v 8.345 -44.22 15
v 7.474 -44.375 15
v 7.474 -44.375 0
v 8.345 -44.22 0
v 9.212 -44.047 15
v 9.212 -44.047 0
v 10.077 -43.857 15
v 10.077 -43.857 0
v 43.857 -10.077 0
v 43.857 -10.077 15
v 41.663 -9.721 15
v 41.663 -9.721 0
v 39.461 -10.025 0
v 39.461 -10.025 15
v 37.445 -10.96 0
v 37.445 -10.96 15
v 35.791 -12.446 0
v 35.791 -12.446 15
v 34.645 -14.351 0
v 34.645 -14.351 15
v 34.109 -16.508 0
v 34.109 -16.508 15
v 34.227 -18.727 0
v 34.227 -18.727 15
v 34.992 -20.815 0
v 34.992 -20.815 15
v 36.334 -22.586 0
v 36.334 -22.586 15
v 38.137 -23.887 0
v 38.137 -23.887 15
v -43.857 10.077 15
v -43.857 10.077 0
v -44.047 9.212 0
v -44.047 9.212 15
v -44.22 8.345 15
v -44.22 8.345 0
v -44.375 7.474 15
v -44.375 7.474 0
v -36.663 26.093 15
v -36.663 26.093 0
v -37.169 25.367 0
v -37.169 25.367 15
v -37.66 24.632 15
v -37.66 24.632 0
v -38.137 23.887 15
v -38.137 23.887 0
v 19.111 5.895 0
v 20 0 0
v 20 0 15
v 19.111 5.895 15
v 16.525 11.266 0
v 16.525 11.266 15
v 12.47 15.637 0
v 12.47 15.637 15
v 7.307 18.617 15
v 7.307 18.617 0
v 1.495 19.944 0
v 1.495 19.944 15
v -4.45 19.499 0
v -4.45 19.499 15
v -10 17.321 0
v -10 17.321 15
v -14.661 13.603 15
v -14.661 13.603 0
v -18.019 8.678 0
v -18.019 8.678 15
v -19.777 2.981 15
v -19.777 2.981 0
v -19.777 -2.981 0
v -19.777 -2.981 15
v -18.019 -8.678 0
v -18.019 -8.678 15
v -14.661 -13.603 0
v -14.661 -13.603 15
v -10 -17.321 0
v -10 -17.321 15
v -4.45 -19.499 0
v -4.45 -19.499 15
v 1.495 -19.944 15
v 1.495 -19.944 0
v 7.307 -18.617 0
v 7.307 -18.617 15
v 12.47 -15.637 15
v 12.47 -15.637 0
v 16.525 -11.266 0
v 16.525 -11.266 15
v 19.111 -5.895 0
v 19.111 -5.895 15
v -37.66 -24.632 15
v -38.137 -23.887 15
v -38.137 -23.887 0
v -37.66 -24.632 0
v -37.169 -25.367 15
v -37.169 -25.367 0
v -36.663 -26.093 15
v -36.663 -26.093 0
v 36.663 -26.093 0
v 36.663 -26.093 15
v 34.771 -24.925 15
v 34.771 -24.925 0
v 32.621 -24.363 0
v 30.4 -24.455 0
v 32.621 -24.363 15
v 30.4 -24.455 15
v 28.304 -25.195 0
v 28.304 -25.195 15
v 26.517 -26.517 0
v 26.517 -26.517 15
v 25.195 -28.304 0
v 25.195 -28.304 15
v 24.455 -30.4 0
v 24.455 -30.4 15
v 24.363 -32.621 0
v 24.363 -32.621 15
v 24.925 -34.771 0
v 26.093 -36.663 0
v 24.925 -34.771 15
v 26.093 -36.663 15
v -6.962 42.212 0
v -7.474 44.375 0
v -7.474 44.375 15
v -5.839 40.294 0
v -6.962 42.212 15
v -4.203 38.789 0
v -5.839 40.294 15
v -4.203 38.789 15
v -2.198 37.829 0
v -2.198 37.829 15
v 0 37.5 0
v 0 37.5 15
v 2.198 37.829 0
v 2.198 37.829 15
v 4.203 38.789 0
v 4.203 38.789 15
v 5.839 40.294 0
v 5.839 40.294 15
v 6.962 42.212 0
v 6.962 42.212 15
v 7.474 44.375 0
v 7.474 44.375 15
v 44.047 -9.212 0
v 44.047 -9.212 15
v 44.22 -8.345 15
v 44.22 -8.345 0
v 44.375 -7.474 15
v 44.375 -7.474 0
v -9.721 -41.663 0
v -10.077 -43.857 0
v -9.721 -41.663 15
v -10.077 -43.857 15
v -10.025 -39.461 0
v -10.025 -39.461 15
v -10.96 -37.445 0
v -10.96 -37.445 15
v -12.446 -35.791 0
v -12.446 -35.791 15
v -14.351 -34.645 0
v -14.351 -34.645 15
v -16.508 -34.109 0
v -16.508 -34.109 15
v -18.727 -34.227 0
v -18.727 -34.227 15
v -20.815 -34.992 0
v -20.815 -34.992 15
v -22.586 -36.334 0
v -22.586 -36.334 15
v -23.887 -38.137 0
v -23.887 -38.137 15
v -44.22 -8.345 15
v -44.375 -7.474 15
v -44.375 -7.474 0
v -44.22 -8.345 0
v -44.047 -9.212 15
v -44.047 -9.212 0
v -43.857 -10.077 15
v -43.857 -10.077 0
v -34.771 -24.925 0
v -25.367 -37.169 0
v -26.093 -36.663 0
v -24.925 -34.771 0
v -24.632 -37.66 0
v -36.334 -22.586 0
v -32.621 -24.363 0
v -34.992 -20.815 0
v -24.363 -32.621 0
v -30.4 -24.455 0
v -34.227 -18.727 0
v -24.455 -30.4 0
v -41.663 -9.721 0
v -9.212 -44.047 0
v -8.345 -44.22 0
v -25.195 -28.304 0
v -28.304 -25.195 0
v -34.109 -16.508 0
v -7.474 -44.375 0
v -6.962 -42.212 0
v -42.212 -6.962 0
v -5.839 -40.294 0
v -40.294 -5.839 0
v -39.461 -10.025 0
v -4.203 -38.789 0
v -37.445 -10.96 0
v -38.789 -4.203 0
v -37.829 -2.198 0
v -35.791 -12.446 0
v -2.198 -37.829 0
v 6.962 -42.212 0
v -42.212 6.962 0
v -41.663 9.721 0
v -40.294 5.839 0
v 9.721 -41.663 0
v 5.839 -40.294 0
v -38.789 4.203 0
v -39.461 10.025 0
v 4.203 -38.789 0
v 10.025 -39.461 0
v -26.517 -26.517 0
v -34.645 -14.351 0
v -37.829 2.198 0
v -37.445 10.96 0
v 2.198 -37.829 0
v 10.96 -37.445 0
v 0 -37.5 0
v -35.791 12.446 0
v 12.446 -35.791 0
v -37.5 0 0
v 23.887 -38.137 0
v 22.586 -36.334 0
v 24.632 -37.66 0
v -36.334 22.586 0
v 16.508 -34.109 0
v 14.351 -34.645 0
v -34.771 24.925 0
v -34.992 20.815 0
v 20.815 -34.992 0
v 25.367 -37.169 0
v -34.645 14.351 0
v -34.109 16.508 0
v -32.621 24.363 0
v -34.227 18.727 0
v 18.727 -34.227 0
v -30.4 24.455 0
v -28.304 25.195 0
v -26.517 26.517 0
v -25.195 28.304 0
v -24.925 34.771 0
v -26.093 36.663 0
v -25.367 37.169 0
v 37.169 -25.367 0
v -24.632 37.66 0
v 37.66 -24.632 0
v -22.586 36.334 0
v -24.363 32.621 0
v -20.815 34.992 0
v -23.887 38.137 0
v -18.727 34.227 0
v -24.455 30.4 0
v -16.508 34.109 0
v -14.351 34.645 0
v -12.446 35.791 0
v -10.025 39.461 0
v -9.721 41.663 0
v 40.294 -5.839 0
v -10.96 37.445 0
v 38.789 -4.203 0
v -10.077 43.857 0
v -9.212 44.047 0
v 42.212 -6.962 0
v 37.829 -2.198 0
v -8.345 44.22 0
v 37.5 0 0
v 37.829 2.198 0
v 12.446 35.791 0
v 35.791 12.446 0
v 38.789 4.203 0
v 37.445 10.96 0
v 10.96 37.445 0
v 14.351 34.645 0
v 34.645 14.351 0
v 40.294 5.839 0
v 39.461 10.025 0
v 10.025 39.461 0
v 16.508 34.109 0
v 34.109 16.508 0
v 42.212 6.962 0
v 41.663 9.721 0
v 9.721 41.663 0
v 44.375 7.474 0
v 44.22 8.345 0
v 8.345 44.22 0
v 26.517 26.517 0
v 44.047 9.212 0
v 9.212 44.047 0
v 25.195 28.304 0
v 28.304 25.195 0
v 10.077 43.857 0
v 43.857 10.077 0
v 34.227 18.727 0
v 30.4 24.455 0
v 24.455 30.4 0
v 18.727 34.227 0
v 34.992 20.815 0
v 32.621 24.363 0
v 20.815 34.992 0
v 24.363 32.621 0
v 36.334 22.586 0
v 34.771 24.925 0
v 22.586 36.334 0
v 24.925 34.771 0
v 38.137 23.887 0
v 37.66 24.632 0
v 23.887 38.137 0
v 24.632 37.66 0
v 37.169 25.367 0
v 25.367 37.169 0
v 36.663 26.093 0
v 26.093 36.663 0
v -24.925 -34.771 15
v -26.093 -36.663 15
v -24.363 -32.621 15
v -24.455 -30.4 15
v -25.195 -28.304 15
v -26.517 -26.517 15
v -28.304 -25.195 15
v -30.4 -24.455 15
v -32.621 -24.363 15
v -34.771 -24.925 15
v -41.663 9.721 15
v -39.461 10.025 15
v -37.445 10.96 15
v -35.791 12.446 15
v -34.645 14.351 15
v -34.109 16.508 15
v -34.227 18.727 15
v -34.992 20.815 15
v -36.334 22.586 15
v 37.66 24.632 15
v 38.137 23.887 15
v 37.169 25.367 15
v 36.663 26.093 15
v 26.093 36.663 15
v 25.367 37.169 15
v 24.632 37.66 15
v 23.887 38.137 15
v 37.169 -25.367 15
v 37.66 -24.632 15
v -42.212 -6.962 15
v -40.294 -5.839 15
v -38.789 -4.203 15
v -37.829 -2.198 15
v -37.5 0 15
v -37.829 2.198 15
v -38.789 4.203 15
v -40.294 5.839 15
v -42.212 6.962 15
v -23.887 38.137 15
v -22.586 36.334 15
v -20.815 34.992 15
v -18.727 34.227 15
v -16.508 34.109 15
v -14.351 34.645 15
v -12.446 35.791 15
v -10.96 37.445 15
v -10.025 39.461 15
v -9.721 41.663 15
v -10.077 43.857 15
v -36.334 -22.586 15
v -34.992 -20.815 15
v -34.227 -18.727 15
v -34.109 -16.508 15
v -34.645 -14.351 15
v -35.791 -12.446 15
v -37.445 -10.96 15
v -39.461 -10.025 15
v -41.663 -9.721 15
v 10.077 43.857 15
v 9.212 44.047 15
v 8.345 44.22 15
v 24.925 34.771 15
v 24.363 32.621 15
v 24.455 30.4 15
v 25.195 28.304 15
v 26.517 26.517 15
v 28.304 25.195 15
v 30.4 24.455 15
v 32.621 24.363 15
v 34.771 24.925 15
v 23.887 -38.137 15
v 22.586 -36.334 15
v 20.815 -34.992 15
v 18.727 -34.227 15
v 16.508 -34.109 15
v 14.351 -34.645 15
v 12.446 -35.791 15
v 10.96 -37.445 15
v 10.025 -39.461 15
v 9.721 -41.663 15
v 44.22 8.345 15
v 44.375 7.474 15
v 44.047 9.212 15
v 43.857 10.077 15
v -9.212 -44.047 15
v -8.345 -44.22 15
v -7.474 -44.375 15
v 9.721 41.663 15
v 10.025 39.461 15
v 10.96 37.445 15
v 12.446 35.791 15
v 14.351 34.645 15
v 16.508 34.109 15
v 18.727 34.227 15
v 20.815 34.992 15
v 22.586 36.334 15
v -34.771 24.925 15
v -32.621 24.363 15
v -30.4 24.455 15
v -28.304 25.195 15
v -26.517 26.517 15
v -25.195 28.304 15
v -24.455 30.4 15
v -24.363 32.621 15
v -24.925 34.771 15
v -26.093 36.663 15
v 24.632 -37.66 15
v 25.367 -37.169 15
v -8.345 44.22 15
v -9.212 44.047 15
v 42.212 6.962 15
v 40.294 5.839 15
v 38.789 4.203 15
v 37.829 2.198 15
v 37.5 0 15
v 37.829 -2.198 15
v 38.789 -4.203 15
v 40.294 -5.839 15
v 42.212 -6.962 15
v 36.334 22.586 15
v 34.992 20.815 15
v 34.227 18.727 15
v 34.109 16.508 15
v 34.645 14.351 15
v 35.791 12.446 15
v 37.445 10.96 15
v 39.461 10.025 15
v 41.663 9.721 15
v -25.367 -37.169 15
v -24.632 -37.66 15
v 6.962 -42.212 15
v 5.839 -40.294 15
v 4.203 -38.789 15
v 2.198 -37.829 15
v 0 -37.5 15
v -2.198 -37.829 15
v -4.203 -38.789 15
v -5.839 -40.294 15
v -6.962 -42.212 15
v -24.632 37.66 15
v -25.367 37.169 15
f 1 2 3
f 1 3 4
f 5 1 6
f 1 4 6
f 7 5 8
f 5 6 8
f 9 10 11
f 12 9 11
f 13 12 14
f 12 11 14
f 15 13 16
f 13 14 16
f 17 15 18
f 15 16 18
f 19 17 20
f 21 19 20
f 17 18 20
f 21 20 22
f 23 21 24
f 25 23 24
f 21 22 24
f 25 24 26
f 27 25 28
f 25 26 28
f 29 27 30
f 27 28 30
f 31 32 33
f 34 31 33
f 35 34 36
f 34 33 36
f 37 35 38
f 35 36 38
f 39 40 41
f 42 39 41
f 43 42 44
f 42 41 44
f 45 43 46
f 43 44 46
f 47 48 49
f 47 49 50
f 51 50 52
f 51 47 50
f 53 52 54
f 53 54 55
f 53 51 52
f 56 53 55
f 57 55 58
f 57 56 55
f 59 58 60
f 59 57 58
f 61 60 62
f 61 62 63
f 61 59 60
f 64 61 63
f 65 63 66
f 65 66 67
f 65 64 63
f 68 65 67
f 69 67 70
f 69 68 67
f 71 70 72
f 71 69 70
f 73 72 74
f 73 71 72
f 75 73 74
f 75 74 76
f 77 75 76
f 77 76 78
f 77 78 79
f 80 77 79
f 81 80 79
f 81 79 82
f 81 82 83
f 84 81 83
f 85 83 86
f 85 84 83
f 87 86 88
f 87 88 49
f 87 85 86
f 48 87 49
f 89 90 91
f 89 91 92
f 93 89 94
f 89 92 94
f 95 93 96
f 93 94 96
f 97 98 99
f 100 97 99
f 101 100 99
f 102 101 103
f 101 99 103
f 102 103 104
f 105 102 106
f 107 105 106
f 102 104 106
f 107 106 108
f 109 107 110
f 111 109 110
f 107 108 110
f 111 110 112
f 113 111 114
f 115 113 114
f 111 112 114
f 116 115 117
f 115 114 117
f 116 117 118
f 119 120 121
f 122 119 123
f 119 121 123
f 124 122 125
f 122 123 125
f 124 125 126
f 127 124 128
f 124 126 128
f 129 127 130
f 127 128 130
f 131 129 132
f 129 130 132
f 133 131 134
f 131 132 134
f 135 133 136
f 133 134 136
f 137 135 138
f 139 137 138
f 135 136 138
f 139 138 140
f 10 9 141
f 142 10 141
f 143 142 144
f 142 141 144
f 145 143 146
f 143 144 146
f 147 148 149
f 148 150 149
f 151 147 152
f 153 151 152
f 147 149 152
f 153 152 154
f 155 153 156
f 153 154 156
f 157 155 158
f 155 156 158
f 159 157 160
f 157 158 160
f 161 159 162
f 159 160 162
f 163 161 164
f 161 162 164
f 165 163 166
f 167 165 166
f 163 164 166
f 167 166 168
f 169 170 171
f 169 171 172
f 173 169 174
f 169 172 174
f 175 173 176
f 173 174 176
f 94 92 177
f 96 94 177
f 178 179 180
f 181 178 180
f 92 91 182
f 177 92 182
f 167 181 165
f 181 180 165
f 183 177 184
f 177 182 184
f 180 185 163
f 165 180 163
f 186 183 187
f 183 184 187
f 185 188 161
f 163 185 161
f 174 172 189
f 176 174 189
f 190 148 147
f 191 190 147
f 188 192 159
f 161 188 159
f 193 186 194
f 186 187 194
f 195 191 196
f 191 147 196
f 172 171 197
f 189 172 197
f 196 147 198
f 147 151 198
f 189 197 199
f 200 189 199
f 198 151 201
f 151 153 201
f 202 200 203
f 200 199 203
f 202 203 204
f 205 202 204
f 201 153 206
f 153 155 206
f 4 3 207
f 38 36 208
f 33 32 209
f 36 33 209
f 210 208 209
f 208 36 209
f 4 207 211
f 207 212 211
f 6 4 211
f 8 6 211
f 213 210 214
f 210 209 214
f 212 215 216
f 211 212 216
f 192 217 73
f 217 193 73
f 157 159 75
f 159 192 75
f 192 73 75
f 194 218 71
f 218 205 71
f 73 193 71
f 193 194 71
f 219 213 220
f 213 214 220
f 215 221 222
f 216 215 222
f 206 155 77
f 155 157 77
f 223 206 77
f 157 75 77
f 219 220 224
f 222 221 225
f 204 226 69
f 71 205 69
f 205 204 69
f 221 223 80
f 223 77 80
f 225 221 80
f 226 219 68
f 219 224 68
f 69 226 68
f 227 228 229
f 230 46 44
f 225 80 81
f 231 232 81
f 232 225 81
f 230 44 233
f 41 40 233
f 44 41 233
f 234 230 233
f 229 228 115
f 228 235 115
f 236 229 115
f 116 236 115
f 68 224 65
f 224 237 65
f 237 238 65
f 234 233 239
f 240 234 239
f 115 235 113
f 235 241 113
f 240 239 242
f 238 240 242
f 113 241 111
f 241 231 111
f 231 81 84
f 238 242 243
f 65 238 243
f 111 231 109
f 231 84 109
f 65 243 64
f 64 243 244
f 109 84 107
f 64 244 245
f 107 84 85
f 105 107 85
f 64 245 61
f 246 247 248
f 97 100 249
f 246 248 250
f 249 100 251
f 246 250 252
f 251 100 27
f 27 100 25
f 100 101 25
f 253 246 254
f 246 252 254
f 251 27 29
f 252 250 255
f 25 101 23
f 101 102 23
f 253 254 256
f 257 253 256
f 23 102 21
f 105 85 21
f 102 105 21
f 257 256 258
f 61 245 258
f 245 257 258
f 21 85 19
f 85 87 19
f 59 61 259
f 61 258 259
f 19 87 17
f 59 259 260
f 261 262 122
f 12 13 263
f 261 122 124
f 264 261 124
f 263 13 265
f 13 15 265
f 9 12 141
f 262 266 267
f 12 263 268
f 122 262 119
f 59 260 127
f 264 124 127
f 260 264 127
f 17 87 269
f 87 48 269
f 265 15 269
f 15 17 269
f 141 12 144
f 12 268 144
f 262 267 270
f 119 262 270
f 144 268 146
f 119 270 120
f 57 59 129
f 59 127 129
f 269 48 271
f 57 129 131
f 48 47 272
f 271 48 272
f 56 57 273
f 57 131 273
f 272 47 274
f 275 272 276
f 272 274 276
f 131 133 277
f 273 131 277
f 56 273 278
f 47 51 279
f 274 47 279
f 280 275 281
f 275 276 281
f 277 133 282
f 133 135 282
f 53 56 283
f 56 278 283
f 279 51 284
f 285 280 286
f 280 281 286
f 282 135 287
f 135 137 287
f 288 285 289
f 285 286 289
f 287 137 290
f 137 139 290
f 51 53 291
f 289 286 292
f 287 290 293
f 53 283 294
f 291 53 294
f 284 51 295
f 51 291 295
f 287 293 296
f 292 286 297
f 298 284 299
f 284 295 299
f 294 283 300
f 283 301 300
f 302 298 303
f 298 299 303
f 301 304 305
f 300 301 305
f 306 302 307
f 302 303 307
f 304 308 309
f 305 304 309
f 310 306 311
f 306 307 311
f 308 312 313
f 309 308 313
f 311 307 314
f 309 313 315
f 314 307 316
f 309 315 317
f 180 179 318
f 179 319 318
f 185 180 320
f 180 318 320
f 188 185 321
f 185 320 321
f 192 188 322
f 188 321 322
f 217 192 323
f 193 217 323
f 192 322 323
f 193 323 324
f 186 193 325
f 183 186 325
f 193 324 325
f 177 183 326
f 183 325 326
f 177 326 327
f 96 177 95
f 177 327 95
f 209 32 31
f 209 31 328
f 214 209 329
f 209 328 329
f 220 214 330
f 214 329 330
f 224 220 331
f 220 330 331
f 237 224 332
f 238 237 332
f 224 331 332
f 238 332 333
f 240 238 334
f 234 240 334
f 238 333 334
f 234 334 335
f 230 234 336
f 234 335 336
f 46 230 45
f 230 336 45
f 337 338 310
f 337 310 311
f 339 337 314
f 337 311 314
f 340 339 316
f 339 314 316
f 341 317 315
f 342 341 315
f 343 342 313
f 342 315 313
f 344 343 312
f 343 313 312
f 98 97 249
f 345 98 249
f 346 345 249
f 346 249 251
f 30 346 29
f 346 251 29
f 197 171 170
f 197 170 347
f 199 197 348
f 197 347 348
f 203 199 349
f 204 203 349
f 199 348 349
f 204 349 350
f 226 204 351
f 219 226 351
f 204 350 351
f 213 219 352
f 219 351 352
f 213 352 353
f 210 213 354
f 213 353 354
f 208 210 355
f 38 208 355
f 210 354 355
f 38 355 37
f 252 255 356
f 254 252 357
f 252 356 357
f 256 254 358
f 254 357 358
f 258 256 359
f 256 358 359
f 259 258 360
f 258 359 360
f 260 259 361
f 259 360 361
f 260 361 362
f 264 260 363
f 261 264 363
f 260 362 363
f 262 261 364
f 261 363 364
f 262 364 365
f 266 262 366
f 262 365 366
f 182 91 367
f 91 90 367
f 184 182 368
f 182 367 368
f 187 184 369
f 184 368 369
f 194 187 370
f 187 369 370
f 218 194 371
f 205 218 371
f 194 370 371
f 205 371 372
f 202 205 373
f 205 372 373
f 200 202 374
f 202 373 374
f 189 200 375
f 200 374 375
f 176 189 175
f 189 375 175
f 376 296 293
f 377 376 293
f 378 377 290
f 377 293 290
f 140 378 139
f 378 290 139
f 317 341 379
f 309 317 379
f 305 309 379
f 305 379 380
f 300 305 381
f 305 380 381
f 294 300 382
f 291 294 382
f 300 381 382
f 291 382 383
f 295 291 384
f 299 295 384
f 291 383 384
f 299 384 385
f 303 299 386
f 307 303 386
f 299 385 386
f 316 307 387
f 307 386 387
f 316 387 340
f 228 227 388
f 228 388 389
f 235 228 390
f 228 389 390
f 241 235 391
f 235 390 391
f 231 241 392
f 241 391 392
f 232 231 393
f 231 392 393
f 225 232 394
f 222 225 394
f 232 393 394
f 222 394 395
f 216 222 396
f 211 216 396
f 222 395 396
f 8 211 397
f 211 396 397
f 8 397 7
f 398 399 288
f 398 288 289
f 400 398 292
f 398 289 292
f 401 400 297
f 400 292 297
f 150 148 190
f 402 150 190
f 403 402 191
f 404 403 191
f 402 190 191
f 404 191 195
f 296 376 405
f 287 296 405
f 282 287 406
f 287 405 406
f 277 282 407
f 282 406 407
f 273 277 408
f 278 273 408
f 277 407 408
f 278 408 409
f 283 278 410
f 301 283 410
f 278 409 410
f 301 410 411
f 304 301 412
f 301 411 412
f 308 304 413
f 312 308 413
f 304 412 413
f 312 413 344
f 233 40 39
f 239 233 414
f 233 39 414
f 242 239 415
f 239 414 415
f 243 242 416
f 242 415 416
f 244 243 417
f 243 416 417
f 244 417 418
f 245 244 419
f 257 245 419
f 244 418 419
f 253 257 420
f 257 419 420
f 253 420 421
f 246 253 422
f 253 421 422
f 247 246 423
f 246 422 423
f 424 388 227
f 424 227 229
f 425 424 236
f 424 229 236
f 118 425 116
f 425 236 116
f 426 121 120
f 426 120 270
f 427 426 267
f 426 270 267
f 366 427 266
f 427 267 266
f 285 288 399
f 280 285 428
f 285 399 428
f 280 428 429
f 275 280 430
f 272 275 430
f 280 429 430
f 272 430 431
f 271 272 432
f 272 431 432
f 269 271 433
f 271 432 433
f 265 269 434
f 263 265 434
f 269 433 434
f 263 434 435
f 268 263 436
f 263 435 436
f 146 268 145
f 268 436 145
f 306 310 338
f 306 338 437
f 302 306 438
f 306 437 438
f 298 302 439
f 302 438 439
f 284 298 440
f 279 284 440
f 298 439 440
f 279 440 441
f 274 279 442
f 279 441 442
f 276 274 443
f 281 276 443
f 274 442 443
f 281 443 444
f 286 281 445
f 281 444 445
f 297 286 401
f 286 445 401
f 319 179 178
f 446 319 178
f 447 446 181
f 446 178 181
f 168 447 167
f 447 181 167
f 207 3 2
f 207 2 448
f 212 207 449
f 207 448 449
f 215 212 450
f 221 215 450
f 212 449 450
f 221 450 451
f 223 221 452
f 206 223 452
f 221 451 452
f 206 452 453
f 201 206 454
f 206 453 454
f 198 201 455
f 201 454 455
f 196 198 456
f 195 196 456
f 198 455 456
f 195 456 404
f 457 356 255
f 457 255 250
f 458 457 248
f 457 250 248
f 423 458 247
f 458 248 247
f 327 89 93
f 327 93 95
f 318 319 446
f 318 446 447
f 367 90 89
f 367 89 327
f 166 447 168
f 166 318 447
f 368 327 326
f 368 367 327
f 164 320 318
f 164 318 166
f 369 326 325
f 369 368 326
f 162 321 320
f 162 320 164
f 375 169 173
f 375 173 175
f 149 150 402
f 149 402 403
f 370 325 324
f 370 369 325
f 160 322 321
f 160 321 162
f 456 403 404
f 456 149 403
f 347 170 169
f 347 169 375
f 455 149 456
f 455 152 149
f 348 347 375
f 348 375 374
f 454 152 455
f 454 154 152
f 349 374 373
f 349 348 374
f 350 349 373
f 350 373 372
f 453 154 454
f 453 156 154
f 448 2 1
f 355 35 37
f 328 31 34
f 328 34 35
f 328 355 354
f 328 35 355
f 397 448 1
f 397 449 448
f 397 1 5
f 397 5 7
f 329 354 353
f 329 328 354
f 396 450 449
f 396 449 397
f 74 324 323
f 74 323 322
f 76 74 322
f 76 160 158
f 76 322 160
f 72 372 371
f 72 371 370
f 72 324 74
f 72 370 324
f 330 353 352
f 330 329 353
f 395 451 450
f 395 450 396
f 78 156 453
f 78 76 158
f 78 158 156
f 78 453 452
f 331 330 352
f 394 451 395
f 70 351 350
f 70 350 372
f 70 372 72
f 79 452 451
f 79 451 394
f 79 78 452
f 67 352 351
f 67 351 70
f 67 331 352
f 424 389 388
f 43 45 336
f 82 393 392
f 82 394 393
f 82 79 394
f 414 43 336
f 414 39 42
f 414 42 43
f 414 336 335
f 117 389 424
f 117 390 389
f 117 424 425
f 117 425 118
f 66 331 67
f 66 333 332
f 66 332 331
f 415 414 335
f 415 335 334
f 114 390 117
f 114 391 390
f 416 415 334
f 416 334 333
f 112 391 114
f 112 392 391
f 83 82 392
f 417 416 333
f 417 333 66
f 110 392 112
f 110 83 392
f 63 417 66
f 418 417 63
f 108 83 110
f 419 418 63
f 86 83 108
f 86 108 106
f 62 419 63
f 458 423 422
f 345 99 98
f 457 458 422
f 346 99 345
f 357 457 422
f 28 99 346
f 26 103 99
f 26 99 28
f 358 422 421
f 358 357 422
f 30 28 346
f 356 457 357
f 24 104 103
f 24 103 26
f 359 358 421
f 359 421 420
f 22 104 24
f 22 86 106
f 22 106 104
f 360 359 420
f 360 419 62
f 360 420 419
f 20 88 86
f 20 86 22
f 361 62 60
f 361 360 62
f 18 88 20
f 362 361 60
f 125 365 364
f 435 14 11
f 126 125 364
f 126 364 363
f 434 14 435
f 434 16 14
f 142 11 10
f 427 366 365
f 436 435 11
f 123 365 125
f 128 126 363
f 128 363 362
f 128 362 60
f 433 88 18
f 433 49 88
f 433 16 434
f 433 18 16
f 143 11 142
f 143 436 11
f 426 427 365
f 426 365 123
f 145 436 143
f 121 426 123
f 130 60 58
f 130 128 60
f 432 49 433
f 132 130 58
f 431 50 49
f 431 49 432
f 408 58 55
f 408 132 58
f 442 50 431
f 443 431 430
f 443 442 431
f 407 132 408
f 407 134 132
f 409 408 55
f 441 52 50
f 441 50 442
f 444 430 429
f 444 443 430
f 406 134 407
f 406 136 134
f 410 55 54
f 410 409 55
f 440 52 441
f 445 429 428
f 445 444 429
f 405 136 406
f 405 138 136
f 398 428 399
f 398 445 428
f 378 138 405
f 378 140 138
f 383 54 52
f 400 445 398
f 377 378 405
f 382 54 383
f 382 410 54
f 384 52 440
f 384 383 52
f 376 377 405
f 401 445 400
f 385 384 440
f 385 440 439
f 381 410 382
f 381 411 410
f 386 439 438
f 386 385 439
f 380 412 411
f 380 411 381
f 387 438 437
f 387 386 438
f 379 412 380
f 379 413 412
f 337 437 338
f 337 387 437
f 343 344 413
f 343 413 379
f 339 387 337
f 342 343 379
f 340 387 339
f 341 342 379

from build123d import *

# Parameters (mm, degrees)
SKETCH1_R           = 45
SKETCH1_R_2         = 20
BOSS_EXTRUDE1_DEPTH = 15
SKETCH2_R           = 7.5
CUT_EXTRUDE1_DEPTH  = 15


with BuildPart() as part:
    # Sketch1 → Boss-Extrude1 (new body)
    with BuildSketch(Plane.XY):
        Circle(SKETCH1_R)
        Circle(SKETCH1_R_2, mode=Mode.SUBTRACT)
    extrude(amount=BOSS_EXTRUDE1_DEPTH)

    # Sketch2 → Cut-Extrude1 (cut)
    with BuildSketch(Plane.XY.offset(15)):
        with Locations((0, 45)):
            Circle(SKETCH2_R)
        with Locations((17.220754456, 41.574578963)):
            Circle(SKETCH2_R)
        with Locations((31.819805153, 31.819805153)):
            Circle(SKETCH2_R)
        with Locations((41.574578963, 17.220754456)):
            Circle(SKETCH2_R)
        with Locations((45, 0)):
            Circle(SKETCH2_R)
        with Locations((41.574578963, -17.220754456)):
            Circle(SKETCH2_R)
        with Locations((31.819805153, -31.819805153)):
            Circle(SKETCH2_R)
        with Locations((17.220754456, -41.574578963)):
            Circle(SKETCH2_R)
        with Locations((0, -45)):
            Circle(SKETCH2_R)
        with Locations((-17.220754456, -41.574578963)):
            Circle(SKETCH2_R)
        with Locations((-31.819805153, -31.819805153)):
            Circle(SKETCH2_R)
        with Locations((-41.574578963, -17.220754456)):
            Circle(SKETCH2_R)
        with Locations((-45, 0)):
            Circle(SKETCH2_R)
        with Locations((-41.574578963, 17.220754456)):
            Circle(SKETCH2_R)
        with Locations((-31.819805153, 31.819805153)):
            Circle(SKETCH2_R)
        with Locations((-17.220754456, 41.574578963)):
            Circle(SKETCH2_R)
    extrude(amount=-CUT_EXTRUDE1_DEPTH, mode=Mode.SUBTRACT)


solid = part.part
